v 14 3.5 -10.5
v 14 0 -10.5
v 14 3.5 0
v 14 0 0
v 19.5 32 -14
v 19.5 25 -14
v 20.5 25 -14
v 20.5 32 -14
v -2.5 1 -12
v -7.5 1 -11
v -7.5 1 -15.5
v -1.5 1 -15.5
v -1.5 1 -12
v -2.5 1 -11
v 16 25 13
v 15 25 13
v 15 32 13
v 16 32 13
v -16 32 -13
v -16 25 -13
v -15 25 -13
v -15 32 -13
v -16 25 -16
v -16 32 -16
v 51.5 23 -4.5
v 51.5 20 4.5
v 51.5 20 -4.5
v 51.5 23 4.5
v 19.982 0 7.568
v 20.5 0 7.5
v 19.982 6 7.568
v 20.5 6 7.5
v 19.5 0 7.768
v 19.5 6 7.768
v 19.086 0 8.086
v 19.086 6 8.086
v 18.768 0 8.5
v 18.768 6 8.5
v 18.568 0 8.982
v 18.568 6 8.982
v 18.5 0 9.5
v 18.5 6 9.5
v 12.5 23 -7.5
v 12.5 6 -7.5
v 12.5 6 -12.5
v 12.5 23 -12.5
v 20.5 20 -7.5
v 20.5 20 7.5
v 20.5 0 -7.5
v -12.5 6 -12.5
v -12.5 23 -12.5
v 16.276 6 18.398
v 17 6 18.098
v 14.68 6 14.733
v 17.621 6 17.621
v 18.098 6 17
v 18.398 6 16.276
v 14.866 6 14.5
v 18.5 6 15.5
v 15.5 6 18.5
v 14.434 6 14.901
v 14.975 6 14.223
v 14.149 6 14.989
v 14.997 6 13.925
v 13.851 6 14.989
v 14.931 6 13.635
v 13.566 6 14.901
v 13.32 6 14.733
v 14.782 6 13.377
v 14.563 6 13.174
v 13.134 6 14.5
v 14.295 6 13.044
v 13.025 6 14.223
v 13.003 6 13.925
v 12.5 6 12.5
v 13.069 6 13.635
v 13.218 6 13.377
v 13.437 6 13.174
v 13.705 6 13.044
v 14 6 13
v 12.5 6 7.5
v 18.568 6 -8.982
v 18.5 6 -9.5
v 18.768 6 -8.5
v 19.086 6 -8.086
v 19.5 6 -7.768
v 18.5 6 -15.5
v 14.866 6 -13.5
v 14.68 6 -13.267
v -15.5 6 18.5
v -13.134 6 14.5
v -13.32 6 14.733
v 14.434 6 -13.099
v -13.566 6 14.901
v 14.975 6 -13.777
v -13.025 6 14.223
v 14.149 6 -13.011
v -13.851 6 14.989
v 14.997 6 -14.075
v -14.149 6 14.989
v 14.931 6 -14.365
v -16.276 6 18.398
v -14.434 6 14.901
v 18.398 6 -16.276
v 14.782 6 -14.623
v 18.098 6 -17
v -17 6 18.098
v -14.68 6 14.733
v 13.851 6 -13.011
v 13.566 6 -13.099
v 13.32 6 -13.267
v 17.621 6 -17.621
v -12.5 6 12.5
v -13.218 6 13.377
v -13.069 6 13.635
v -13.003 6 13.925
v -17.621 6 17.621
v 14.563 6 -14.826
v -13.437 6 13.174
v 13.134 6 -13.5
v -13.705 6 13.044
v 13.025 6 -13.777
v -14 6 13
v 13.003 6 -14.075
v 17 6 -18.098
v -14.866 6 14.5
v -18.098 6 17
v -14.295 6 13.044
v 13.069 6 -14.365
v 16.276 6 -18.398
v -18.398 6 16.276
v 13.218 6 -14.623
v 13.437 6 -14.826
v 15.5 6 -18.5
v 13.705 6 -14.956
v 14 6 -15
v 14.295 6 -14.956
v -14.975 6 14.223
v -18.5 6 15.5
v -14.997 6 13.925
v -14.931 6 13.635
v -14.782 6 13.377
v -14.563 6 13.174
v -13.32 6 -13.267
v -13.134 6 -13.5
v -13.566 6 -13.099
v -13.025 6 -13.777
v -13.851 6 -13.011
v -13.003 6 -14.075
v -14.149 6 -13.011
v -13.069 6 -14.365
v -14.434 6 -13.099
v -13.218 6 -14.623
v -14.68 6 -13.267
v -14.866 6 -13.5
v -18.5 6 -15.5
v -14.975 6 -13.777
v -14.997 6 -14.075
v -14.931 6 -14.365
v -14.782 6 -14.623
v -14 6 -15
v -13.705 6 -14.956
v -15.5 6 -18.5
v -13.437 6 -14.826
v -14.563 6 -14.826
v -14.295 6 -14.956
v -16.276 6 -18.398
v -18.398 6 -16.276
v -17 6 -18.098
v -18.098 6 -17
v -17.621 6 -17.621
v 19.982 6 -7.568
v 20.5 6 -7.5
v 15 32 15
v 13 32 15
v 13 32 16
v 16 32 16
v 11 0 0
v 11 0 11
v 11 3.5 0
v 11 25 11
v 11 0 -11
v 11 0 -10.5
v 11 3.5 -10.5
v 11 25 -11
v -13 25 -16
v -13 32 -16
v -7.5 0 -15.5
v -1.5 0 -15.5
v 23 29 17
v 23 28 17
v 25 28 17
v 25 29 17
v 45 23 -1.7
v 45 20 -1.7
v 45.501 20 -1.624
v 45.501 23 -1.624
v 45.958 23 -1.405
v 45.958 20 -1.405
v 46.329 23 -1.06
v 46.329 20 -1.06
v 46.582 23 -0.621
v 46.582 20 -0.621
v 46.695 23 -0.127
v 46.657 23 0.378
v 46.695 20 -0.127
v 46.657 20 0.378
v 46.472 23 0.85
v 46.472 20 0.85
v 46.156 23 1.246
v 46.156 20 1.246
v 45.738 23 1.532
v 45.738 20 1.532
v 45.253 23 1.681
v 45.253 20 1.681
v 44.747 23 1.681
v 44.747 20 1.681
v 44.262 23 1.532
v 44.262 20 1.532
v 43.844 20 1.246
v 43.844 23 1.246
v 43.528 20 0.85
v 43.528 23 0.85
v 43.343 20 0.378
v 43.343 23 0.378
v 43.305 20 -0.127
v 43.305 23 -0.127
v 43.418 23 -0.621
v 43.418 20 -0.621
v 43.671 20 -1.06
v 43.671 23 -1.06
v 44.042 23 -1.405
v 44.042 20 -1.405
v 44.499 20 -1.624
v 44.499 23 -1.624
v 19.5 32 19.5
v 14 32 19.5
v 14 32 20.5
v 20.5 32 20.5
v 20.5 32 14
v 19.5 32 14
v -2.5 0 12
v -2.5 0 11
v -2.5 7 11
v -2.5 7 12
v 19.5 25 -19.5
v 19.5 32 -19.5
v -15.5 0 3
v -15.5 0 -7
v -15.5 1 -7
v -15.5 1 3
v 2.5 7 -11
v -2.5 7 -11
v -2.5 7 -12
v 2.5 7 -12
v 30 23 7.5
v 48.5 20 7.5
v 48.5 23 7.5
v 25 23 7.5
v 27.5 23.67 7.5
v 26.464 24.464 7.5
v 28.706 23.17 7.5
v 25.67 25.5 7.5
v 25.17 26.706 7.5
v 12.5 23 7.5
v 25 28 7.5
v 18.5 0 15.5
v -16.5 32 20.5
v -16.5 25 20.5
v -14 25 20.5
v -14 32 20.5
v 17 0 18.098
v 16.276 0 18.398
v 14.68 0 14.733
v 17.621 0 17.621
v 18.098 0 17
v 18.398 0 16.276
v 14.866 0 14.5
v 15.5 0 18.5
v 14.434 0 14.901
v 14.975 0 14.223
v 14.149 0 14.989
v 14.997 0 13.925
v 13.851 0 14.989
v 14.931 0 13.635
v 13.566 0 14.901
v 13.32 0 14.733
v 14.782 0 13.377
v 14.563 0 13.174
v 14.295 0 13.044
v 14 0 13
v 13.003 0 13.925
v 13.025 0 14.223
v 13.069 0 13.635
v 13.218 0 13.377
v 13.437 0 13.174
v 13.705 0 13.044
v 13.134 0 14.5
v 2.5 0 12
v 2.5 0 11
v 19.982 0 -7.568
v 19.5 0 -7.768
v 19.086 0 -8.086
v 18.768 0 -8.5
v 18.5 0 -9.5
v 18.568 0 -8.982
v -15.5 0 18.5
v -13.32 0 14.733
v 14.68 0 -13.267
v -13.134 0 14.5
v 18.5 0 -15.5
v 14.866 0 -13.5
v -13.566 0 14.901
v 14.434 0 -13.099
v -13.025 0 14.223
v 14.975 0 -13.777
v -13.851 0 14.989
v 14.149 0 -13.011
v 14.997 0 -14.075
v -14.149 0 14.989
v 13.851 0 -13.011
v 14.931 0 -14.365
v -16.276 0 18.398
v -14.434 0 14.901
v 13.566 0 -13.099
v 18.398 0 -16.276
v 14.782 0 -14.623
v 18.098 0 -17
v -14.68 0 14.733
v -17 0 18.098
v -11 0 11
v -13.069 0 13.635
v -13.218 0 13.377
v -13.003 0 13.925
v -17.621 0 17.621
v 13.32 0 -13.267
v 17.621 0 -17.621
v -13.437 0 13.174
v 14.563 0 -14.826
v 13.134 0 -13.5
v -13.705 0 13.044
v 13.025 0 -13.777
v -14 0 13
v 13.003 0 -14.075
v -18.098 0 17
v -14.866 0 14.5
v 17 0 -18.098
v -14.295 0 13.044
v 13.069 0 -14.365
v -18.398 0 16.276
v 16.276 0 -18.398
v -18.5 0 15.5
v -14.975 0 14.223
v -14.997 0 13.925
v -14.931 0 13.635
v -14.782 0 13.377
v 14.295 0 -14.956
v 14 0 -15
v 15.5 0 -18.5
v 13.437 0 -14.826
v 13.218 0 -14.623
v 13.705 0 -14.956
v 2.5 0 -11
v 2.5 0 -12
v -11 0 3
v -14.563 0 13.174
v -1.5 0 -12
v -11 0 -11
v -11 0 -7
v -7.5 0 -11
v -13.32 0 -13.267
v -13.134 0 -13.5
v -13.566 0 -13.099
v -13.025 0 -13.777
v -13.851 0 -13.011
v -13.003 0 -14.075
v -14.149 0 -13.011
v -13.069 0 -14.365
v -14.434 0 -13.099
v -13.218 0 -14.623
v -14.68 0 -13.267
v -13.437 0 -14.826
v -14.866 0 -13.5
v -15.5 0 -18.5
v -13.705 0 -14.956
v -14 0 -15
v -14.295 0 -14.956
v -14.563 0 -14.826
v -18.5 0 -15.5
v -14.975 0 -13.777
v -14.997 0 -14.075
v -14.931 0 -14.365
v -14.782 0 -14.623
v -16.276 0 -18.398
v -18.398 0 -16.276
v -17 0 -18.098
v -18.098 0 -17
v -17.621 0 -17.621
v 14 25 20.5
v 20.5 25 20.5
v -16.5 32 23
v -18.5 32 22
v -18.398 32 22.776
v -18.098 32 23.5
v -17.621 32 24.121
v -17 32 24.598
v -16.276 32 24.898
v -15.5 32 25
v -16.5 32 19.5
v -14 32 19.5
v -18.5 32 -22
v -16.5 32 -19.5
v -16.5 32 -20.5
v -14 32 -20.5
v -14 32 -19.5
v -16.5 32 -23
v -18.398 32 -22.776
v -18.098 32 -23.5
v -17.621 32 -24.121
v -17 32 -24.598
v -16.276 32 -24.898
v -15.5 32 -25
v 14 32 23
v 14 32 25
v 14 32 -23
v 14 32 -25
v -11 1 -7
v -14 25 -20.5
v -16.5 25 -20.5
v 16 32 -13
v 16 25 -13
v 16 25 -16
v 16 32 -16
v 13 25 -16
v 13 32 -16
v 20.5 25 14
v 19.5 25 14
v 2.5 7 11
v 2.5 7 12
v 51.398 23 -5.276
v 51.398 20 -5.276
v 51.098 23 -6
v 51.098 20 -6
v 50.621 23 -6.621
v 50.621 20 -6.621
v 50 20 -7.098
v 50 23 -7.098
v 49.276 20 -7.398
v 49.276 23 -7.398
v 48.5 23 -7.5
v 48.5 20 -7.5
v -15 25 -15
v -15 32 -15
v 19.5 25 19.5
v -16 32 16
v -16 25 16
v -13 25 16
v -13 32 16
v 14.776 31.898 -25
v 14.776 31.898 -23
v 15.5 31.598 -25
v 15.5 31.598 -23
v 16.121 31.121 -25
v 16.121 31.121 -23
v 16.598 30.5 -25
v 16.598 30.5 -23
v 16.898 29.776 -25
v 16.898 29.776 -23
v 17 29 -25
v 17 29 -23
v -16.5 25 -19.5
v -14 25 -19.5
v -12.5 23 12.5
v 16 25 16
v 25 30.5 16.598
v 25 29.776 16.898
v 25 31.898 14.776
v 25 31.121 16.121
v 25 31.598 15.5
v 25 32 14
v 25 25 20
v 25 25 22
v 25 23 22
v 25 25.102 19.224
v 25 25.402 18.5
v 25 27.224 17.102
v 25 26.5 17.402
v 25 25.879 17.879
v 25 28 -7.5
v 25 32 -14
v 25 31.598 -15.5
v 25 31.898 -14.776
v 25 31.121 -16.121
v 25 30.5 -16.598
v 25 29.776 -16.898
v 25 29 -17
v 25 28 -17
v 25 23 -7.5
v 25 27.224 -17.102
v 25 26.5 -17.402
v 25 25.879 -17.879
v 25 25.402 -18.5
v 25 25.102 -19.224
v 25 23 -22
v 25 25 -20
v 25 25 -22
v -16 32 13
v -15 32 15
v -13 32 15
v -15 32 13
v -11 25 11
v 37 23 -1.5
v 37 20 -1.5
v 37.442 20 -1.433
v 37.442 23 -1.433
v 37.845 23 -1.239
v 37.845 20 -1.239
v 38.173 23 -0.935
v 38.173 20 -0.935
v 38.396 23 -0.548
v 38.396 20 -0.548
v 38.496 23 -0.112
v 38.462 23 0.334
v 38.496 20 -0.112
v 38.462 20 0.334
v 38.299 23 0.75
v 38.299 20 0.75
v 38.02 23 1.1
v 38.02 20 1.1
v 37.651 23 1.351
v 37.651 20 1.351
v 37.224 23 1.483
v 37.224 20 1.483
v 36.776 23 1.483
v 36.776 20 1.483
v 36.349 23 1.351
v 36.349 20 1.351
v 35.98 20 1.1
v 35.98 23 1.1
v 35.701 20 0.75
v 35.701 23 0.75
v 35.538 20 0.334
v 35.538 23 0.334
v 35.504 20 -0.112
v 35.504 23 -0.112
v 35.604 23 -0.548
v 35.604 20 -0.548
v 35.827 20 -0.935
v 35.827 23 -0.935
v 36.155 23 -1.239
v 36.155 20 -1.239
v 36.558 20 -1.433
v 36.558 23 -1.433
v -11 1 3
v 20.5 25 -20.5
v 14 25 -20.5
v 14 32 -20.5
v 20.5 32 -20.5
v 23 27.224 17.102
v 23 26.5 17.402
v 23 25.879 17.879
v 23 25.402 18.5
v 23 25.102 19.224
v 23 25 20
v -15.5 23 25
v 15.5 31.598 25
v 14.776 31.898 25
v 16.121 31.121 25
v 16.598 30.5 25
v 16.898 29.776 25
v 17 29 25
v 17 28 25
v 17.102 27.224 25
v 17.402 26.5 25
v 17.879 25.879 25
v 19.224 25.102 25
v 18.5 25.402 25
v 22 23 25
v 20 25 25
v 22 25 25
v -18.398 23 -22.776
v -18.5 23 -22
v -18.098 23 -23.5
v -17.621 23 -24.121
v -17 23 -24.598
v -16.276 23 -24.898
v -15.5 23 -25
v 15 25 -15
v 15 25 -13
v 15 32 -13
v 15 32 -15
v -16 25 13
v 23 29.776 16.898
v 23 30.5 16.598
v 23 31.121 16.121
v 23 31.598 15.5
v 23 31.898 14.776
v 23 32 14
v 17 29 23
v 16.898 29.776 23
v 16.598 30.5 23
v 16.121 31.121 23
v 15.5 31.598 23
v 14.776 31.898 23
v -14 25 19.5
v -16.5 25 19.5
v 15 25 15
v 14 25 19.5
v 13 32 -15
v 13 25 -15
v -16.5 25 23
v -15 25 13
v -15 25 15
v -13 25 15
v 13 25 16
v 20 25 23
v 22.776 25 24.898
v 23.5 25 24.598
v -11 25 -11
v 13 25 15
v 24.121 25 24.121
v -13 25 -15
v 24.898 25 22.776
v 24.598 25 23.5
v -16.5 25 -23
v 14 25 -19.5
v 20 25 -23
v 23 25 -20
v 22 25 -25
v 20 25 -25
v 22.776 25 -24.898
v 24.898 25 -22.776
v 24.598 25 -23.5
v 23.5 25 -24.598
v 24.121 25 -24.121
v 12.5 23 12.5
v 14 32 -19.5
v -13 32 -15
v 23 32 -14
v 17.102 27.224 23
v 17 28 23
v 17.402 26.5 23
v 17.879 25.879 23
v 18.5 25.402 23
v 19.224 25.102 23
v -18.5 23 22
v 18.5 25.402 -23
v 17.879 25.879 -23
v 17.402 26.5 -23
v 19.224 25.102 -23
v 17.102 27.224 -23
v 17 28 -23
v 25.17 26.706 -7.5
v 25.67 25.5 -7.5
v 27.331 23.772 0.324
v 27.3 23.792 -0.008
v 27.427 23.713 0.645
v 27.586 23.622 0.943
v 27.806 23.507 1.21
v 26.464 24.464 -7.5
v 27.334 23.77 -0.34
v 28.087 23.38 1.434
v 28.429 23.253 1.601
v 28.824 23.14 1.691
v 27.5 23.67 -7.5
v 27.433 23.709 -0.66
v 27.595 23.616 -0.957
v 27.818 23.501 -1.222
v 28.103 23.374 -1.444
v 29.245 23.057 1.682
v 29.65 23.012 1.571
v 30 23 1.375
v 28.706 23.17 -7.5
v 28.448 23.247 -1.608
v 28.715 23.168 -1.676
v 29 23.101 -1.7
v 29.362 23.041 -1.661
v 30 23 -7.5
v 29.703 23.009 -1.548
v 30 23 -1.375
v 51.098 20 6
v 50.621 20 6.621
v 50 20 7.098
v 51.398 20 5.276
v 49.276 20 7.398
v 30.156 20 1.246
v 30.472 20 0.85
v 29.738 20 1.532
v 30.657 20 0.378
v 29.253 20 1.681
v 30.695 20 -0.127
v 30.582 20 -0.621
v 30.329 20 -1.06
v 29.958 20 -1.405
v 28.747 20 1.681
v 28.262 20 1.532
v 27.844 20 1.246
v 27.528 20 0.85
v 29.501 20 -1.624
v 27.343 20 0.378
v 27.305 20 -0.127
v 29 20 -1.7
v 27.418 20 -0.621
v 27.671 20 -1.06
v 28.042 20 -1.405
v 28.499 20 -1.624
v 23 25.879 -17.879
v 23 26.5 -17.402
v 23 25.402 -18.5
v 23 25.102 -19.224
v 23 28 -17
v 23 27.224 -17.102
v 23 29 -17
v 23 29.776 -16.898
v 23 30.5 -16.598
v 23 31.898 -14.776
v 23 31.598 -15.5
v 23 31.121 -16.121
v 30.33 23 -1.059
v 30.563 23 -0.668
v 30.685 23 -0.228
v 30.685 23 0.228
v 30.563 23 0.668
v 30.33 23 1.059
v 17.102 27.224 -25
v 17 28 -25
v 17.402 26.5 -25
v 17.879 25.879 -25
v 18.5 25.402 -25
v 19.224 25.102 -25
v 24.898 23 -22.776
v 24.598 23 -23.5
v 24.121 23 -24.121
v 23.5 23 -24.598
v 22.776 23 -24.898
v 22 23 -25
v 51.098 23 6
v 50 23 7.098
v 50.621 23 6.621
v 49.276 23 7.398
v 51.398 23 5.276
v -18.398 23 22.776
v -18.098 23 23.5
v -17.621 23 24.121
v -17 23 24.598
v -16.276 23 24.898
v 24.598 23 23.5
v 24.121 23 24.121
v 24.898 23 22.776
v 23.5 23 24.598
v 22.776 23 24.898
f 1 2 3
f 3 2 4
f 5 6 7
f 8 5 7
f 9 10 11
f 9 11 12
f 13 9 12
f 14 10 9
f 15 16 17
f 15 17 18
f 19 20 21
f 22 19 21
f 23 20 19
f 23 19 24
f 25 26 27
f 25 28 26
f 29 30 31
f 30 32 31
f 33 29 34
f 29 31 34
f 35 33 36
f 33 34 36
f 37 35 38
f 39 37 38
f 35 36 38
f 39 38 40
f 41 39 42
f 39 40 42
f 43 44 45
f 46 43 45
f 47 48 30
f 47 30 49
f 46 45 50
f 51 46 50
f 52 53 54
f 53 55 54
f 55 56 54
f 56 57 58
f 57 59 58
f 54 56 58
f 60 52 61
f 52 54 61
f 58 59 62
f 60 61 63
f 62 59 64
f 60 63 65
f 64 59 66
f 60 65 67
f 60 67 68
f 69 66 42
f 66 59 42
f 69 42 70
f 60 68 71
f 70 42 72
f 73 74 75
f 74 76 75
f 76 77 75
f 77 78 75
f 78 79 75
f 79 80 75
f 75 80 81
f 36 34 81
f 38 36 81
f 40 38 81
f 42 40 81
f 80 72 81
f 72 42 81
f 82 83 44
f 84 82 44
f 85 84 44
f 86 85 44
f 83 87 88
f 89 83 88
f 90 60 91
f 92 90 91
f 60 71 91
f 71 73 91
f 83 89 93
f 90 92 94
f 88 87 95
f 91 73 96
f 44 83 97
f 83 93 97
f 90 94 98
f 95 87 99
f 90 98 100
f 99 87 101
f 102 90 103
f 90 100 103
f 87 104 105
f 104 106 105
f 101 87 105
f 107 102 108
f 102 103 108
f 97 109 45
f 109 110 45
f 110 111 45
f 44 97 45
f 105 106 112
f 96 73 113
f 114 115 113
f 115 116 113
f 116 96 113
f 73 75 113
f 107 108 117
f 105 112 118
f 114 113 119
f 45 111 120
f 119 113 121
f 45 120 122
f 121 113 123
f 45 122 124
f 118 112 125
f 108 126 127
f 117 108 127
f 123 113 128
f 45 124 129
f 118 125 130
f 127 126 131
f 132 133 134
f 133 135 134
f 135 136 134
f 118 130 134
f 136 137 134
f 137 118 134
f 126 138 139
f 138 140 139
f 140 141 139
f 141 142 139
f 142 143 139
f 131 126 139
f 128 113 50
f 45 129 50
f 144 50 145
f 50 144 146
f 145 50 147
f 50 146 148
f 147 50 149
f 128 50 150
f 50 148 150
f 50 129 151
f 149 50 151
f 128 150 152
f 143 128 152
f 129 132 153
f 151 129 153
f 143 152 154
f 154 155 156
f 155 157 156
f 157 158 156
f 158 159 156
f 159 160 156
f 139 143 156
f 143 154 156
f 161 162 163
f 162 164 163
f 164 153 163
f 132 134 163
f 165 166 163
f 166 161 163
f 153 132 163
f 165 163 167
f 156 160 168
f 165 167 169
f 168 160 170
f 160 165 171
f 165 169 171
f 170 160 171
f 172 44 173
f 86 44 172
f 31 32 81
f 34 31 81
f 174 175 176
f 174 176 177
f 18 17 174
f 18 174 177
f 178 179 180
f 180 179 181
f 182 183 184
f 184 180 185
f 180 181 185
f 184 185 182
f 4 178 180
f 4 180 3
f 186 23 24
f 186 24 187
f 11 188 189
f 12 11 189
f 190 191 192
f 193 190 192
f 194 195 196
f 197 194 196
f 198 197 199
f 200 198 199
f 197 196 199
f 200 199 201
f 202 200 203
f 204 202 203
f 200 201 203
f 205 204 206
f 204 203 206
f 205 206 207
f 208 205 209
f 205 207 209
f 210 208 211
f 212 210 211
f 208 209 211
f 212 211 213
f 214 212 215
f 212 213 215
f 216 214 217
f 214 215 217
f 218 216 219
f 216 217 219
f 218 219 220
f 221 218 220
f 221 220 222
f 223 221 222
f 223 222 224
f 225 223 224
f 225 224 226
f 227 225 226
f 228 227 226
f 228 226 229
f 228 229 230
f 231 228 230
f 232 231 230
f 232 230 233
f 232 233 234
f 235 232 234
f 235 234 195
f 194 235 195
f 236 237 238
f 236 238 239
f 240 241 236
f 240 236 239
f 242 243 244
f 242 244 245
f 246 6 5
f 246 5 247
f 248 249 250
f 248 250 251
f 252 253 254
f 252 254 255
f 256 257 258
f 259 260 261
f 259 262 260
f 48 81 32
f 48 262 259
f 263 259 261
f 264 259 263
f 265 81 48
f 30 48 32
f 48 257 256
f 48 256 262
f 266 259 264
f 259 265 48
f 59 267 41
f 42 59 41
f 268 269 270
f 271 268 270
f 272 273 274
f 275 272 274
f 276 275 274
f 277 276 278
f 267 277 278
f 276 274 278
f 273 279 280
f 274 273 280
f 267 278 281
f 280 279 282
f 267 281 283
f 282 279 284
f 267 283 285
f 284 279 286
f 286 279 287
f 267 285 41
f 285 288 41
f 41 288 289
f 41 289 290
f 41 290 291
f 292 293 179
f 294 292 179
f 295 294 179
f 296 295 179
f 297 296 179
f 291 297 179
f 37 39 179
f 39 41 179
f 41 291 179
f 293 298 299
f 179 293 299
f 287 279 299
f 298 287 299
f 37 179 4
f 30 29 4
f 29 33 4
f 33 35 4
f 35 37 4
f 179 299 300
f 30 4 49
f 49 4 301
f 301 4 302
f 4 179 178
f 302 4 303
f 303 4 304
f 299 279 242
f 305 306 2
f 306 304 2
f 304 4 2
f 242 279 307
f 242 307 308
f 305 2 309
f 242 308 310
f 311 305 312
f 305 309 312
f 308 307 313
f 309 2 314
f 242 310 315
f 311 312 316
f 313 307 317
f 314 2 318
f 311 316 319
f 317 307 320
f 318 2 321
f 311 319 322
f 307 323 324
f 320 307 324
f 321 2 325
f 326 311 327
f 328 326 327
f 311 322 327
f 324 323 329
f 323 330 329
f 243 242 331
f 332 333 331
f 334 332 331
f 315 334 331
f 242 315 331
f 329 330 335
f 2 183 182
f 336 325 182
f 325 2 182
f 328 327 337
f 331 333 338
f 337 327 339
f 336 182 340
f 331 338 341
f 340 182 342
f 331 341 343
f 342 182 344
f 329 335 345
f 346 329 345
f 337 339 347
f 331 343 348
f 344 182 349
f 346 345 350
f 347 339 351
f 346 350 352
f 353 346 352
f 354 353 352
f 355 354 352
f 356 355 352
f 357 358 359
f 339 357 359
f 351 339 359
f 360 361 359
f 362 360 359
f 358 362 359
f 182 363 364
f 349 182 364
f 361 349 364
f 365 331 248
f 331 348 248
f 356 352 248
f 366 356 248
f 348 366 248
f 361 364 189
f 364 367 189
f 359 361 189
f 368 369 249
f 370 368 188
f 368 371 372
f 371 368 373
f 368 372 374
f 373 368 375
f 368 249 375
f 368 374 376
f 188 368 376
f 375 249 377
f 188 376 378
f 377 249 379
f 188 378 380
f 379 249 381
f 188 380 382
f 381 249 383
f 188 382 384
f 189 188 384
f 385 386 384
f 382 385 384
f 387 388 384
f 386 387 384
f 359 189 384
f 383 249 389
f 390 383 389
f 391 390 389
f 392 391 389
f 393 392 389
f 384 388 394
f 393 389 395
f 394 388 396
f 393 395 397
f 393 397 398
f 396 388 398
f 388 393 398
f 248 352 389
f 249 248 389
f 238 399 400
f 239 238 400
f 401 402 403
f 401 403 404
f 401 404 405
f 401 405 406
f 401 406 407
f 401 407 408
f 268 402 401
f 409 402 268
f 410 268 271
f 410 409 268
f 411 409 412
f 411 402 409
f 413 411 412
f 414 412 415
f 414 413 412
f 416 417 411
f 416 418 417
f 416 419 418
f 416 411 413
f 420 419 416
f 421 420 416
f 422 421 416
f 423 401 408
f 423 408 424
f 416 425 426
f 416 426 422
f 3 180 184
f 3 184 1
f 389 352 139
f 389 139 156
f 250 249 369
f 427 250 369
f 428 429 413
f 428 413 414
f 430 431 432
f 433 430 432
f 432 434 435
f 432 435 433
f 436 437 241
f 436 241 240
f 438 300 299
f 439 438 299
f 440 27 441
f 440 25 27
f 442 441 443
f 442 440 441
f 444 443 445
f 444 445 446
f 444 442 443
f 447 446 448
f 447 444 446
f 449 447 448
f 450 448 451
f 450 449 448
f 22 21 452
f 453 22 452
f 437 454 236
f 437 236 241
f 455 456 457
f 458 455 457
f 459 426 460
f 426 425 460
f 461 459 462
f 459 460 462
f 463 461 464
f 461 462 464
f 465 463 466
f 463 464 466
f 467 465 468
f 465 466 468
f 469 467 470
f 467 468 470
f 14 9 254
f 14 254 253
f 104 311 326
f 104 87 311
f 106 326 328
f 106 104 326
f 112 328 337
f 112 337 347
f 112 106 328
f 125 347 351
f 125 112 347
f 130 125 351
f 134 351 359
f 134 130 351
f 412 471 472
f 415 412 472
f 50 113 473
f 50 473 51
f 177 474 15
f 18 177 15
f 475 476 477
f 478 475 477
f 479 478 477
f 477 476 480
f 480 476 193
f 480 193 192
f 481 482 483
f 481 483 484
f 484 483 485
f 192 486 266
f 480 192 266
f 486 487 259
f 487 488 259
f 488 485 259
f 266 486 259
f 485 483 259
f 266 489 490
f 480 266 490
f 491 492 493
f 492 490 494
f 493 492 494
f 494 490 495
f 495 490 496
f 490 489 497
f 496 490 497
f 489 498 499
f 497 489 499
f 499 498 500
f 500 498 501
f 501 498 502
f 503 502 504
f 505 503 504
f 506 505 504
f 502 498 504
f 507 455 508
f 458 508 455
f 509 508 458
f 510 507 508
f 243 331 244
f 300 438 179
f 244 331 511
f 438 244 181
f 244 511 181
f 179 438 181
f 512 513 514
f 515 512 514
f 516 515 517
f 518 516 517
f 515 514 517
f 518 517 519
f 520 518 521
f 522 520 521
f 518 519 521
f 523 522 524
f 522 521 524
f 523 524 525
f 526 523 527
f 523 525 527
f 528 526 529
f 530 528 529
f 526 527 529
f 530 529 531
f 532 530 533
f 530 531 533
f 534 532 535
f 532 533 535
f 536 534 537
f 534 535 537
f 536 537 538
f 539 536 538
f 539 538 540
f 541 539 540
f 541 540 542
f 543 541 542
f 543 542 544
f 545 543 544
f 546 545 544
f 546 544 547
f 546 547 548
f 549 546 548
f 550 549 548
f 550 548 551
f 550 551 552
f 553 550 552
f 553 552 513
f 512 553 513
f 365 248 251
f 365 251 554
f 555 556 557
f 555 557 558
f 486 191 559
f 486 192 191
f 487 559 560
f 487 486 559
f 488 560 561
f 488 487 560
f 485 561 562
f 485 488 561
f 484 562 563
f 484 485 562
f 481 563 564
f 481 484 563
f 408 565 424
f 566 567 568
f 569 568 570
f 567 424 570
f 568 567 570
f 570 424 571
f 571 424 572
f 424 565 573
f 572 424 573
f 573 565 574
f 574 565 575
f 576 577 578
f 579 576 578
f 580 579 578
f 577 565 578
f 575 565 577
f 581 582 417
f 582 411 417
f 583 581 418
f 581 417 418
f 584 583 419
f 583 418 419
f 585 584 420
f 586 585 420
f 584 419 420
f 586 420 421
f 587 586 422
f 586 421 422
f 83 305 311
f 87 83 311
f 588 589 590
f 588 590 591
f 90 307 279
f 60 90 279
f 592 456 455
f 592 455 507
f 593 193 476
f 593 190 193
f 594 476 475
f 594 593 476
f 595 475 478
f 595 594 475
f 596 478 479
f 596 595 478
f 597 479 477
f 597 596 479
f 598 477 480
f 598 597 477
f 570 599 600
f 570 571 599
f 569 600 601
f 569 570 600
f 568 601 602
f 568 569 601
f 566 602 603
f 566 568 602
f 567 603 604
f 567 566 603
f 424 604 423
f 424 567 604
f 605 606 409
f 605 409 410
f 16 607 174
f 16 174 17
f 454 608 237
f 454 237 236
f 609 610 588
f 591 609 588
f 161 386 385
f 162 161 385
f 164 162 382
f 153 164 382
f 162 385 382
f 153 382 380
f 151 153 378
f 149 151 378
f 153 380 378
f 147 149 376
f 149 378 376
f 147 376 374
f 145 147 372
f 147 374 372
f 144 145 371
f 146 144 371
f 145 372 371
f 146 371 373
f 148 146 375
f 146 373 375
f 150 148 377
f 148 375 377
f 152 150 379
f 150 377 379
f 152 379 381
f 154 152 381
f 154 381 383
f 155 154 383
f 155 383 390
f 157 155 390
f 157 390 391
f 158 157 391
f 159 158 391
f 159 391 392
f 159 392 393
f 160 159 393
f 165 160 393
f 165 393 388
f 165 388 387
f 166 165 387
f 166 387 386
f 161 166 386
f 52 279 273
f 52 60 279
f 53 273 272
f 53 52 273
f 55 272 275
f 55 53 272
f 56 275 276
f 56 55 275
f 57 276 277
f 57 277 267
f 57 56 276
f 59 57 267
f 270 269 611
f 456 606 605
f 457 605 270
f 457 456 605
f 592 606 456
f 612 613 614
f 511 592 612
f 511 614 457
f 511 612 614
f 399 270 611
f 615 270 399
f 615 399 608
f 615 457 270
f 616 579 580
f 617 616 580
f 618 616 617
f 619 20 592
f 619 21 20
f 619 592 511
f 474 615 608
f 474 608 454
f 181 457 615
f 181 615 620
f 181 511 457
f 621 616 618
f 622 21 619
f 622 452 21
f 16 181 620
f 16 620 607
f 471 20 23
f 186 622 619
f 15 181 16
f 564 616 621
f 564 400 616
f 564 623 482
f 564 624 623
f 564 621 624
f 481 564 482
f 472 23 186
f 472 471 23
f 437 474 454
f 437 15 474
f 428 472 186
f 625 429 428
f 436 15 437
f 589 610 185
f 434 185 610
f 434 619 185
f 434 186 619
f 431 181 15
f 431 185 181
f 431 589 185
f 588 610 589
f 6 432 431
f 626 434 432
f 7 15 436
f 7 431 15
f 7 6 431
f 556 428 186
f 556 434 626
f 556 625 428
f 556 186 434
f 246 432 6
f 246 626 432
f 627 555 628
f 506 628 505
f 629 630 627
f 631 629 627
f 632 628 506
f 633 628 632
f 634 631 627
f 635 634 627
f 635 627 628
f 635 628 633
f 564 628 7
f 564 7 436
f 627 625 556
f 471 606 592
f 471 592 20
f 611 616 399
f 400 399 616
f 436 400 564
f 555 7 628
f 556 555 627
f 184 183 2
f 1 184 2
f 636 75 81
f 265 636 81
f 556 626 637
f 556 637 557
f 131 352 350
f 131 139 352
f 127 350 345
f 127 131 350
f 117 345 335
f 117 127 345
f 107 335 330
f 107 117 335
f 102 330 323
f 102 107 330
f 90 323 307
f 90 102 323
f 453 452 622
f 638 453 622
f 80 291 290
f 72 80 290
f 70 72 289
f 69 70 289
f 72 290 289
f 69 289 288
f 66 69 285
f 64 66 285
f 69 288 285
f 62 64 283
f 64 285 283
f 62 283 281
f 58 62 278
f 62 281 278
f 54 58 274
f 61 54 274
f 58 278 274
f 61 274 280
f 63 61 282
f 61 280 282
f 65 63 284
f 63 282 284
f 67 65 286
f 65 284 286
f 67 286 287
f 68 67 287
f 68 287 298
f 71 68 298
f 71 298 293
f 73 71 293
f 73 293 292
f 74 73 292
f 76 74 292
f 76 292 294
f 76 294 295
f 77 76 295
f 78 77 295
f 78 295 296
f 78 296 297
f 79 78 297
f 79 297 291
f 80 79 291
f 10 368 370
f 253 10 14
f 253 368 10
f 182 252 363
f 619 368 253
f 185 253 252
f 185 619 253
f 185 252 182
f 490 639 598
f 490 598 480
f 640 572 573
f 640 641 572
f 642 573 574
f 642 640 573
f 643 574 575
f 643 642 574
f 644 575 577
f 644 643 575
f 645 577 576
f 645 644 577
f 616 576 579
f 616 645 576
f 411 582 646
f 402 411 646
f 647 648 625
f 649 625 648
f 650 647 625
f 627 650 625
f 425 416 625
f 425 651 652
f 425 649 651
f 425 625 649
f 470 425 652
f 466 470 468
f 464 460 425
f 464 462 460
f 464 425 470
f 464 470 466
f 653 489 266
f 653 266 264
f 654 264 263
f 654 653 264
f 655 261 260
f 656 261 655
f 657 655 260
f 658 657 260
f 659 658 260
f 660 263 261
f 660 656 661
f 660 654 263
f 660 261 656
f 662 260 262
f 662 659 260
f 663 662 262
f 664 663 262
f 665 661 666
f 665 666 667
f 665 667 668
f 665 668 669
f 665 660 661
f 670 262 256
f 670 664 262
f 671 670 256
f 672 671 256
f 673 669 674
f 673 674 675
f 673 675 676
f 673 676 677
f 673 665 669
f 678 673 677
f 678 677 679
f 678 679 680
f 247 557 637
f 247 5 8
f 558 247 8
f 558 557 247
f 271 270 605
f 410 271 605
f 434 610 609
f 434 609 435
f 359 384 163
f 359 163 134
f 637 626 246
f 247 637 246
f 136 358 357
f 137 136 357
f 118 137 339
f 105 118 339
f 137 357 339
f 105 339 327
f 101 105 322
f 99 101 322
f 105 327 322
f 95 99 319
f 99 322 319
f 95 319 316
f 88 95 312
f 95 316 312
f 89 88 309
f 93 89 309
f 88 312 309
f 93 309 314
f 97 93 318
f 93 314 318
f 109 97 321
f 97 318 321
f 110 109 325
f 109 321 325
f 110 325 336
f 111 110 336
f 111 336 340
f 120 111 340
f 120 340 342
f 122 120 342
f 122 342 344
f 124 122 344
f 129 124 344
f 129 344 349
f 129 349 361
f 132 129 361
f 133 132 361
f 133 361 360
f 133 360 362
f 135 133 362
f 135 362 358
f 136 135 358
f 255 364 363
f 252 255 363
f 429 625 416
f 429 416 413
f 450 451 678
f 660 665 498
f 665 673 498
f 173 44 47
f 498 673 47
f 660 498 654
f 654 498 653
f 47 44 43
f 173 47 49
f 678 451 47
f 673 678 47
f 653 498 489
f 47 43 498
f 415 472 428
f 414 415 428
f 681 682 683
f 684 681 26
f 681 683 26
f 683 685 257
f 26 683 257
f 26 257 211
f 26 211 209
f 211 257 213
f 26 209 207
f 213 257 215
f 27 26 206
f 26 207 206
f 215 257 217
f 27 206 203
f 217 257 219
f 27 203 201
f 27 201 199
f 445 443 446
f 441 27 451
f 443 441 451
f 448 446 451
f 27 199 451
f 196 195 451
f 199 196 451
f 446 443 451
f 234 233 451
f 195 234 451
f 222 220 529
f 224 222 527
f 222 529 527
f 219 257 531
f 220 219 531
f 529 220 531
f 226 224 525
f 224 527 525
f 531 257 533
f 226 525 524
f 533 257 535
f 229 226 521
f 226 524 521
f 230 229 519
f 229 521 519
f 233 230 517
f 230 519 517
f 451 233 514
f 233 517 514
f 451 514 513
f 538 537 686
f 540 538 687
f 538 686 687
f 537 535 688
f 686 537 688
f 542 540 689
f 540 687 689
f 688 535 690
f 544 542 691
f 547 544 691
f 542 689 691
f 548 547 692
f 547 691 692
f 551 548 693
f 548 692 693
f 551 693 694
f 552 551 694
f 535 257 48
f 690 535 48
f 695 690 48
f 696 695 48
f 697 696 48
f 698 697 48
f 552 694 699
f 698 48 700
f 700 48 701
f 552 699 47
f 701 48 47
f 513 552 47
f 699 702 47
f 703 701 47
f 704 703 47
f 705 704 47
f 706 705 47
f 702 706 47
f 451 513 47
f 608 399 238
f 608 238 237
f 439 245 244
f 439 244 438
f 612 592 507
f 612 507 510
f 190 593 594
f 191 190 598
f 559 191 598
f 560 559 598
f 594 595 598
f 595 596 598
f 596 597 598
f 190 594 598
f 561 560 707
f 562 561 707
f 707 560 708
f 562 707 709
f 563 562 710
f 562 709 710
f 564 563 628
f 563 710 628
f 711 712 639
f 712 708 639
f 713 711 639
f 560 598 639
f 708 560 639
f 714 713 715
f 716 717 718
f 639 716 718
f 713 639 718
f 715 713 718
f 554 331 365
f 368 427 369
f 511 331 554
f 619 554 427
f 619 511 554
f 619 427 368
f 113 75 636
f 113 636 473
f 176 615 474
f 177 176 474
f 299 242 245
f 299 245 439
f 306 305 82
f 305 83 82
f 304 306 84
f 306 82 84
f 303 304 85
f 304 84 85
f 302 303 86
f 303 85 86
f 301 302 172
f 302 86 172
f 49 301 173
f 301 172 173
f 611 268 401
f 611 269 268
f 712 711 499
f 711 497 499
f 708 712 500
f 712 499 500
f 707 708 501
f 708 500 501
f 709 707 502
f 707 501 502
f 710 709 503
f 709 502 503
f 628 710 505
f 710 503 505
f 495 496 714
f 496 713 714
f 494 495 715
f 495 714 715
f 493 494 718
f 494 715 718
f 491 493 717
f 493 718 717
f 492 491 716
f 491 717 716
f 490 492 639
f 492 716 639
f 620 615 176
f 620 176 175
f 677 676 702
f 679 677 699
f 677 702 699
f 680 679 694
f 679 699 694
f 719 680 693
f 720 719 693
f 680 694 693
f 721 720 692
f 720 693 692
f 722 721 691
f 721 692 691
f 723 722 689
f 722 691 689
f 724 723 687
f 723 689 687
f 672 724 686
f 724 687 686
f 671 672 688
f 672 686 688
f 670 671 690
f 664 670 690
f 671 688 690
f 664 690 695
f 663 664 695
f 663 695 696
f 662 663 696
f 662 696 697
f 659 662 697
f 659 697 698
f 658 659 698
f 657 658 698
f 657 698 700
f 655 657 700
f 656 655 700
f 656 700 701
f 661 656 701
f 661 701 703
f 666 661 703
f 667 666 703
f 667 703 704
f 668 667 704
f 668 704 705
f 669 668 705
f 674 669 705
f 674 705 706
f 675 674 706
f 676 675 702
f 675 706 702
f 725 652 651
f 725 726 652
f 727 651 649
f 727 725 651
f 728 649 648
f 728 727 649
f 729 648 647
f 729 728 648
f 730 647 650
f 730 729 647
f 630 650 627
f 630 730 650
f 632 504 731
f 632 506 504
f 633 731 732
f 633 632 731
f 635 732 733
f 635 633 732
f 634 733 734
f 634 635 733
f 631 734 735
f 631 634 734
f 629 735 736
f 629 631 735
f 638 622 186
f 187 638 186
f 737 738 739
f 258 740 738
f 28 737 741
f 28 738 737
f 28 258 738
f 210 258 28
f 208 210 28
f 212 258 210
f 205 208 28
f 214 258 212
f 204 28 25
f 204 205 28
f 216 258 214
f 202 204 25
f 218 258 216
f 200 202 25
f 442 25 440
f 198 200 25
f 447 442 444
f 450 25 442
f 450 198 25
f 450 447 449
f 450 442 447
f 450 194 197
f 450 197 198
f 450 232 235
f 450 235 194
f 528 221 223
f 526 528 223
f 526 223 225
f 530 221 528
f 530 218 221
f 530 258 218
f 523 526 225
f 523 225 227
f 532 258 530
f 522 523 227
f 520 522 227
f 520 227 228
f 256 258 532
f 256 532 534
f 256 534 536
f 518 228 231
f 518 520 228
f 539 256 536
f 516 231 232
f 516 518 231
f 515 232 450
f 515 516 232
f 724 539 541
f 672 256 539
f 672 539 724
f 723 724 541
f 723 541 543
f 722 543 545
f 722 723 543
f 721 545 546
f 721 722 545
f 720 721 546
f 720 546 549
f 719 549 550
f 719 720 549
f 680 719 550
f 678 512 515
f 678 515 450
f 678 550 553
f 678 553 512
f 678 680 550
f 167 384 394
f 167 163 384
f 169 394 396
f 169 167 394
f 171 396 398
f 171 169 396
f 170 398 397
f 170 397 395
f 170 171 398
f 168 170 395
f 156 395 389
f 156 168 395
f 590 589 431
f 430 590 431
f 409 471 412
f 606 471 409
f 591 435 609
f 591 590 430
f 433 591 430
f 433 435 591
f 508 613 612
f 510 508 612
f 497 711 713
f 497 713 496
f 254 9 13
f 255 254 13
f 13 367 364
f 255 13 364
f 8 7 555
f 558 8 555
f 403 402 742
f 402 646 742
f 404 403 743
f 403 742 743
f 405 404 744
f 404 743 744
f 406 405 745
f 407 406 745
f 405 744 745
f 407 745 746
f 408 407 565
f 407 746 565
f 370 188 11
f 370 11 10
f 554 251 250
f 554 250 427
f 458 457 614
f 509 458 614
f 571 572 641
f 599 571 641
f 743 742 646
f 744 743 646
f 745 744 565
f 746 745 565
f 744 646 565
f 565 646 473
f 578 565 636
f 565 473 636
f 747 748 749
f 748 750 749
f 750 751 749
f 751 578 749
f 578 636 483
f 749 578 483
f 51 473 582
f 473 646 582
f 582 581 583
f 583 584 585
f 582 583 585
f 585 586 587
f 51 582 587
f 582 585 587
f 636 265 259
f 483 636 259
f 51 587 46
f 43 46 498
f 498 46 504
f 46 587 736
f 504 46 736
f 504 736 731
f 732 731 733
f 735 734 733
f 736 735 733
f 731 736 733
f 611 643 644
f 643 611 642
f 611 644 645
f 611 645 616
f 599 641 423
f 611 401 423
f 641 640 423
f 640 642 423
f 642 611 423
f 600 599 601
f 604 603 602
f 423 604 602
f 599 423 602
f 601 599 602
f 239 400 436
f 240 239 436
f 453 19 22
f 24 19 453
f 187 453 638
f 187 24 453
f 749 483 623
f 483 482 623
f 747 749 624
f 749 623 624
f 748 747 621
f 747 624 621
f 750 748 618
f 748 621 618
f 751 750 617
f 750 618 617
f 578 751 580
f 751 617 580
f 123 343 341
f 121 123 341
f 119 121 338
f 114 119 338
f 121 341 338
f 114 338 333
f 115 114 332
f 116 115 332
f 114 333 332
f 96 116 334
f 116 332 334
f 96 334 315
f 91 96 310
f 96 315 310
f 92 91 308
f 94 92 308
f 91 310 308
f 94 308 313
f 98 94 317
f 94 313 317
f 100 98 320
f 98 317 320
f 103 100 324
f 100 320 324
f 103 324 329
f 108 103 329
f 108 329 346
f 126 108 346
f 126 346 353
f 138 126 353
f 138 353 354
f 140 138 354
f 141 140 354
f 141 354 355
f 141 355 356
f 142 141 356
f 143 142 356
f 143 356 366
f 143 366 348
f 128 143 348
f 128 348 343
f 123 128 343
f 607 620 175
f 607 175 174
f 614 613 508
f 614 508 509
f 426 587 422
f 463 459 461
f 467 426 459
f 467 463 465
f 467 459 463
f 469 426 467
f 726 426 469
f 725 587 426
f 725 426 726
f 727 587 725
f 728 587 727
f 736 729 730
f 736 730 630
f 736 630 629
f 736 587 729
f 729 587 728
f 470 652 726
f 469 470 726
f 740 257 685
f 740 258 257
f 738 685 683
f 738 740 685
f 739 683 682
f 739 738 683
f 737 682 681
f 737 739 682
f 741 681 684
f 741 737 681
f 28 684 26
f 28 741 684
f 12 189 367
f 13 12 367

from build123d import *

# Parameters (mm, degrees)
SKETCH_2_W            = 37
SKETCH_2_H            = 37
EXTRUDE_1_DEPTH       = 23
SKETCH_3_W            = 22
SKETCH_3_H            = 22
CUT_EXTRUDE_1_DEPTH   = 23
SKETCH_19_OUTSIDE_W   = 50.432
SKETCH_19_OUTSIDE_H   = 50.432
SKETCH_19_OUTSIDE_W_2 = 25
SKETCH_19_OUTSIDE_H_2 = 25
CUT_EXTRUDE_17_DEPTH  = 17
SKETCH_4_W            = 50
SKETCH_4_H            = 50
EXTRUDE_2_DEPTH       = 9
SKETCH_5_W            = 46
SKETCH_5_H            = 46
CUT_EXTRUDE_3_DEPTH   = 7
SKETCH_12_W           = 8
SKETCH_12_H           = 8
CUT_EXTRUDE_14_DEPTH  = 14
SKETCH_6_W            = 22
SKETCH_6_H            = 22
CUT_EXTRUDE_4_DEPTH   = 2
SKETCH_11_R           = 1
CUT_EXTRUDE_7_DEPTH   = 8
SKETCH_13_W           = 41
SKETCH_13_H           = 41
SKETCH_13_W_2         = 39
SKETCH_13_H_2         = 39
EXTRUDE_3_DEPTH       = 7
SKETCH_17_W           = 32
SKETCH_17_H           = 32
SKETCH_17_W_2         = 30
SKETCH_17_H_2         = 30
EXTRUDE_4_DEPTH       = 7
SKETCH_15_W           = 28
SKETCH_15_H           = 1
SKETCH_15_W_2         = 1
SKETCH_15_H_2         = 28
CUT_EXTRUDE_15_DEPTH  = 7
SKETCH_18_W           = 1
SKETCH_18_H           = 26
SKETCH_18_W_2         = 26
SKETCH_18_H_2         = 1
CUT_EXTRUDE_16_DEPTH  = 7
SKETCH_20_W           = 3
SKETCH_20_H           = 10.5
CUT_EXTRUDE_18_DEPTH  = 3.5
SKETCH_21_W           = 4.5
SKETCH_21_H           = 10
CUT_EXTRUDE_19_DEPTH  = 1
SKETCH_22_W           = 5
SKETCH_22_H           = 1
CUT_EXTRUDE_21_DEPTH  = 7
SKETCH_24_W           = 6
SKETCH_24_H           = 4.5
CUT_EXTRUDE_22_DEPTH  = 1
SKETCH_25_W           = 6
SKETCH_25_H           = 15
EXTRUDE_5_DEPTH       = 17
SKETCH_26_W           = 15
SKETCH_26_H           = 3
EXTRUDE_6_DEPTH       = 33
SKETCH_28_W           = 6.5
SKETCH_28_H           = 50
CUT_EXTRUDE_27_DEPTH  = 13
SKETCH_32_W           = 2
SKETCH_32_H           = 50
EXTRUDE_9_DEPTH       = 9
FILLET_5_R            = 3
FILLET_6_R            = 3
FILLET_7_R            = 3
FILLET_8_R            = 3
FILLET_9_R            = 3
FILLET_10_R           = 3
FILLET_11_R           = 3
FILLET_12_R           = 3
FILLET_13_R           = 3
FILLET_14_R           = 3
FILLET_15_R           = 3
FILLET_16_R           = 3
FILLET_17_R           = 5
FILLET_19_R           = 3
FILLET_20_R           = 3
FILLET_21_R           = 3
FILLET_22_R           = 3
SKETCH_34_W           = 15
SKETCH_34_H           = 20
EXTRUDE_10_DEPTH      = 2
SKETCH_33_R           = 1.7
SKETCH_33_R_2         = 1.5
CUT_EXTRUDE_28_DEPTH  = 7
FILLET_23_R           = 3
FILLET_24_R           = 3
FILLET_25_R           = 2
FILLET_26_R           = 2


with BuildPart() as part:
    # 草图2 → 凸台-拉伸1 (new body)
    with BuildSketch(Plane(origin=(0, 0, 0), x_dir=(1, 0, 0), z_dir=(0, 1, 0))):
        Rectangle(SKETCH_2_W, SKETCH_2_H)
    extrude(amount=EXTRUDE_1_DEPTH)

    # 草图3 → 切除-拉伸1 (cut)
    with BuildSketch(Plane.XZ):
        Rectangle(SKETCH_3_W, SKETCH_3_H)
    extrude(amount=-CUT_EXTRUDE_1_DEPTH, mode=Mode.SUBTRACT)

    # 草图19 outside → 切除-拉伸17 (cut)
    with BuildSketch(Plane(origin=(0, 6, 0), x_dir=(-1, 0, 0), z_dir=(0, -1, 0))):
        Rectangle(SKETCH_19_OUTSIDE_W, SKETCH_19_OUTSIDE_H)
        Rectangle(SKETCH_19_OUTSIDE_W_2, SKETCH_19_OUTSIDE_H_2, mode=Mode.SUBTRACT)
    extrude(amount=-CUT_EXTRUDE_17_DEPTH, mode=Mode.SUBTRACT)

    # 草图4 → 凸台-拉伸2 (add)
    with BuildSketch(Plane(origin=(0, 23, 0), x_dir=(1, 0, 0), z_dir=(0, 1, 0))):
        Rectangle(SKETCH_4_W, SKETCH_4_H)
    extrude(amount=EXTRUDE_2_DEPTH)

    # 草图5 → 切除-拉伸3 (cut)
    with BuildSketch(Plane(origin=(0, 32, 0), x_dir=(1, 0, 0), z_dir=(0, 1, 0))):
        Rectangle(SKETCH_5_W, SKETCH_5_H)
    extrude(amount=-CUT_EXTRUDE_3_DEPTH, mode=Mode.SUBTRACT)

    # 草图12 → 切除-拉伸14 (cut)
    with BuildSketch(Plane(origin=(0, 25, 0), x_dir=(1, 0, 0), z_dir=(0, 1, 0))):
        with Locations((-21, -21)):
            Rectangle(SKETCH_12_W, SKETCH_12_H)
        with Locations((-21, 21)):
            Rectangle(SKETCH_12_W, SKETCH_12_H)
        with Locations((21, 21)):
            Rectangle(SKETCH_12_W, SKETCH_12_H)
        with Locations((21, -21)):
            Rectangle(SKETCH_12_W, SKETCH_12_H)
    extrude(amount=CUT_EXTRUDE_14_DEPTH, mode=Mode.SUBTRACT)

    # 草图6 → 切除-拉伸4 (cut)
    with BuildSketch(Plane(origin=(0, 25, 0), x_dir=(1, 0, 0), z_dir=(0, 1, 0))):
        Rectangle(SKETCH_6_W, SKETCH_6_H)
    extrude(amount=-CUT_EXTRUDE_4_DEPTH, mode=Mode.SUBTRACT)

    # 草图11 → 切除-拉伸7 (cut)
    with BuildSketch(Plane.XZ):
        with Locations(Location((14, 14, 0), (0, 0, 270))):
            Circle(SKETCH_11_R)
        with Locations(Location((14, -14, 0), (0, 0, 270))):
            Circle(SKETCH_11_R)
        with Locations(Location((-14, -14, 0), (0, 0, 270))):
            Circle(SKETCH_11_R)
        with Locations(Location((-14, 14, 0), (0, 0, 270))):
            Circle(SKETCH_11_R)
    extrude(amount=-CUT_EXTRUDE_7_DEPTH, mode=Mode.SUBTRACT)

    # 草图13 → 凸台-拉伸3 (add)
    with BuildSketch(Plane(origin=(0, 25, 0), x_dir=(1, 0, 0), z_dir=(0, 1, 0))):
        Rectangle(SKETCH_13_W, SKETCH_13_H)
        Rectangle(SKETCH_13_W_2, SKETCH_13_H_2, mode=Mode.SUBTRACT)
    extrude(amount=EXTRUDE_3_DEPTH)

    # 草图17 → 凸台-拉伸4 (add)
    with BuildSketch(Plane(origin=(0, 25, 0), x_dir=(1, 0, 0), z_dir=(0, 1, 0))):
        Rectangle(SKETCH_17_W, SKETCH_17_H)
        Rectangle(SKETCH_17_W_2, SKETCH_17_H_2, mode=Mode.SUBTRACT)
    extrude(amount=EXTRUDE_4_DEPTH)

    # 草图15 → 切除-拉伸15 (cut)
    with BuildSketch(Plane(origin=(0, 25, 0), x_dir=(1, 0, 0), z_dir=(0, 1, 0))):
        with Locations((0, -20)):
            Rectangle(SKETCH_15_W, SKETCH_15_H)
        with Locations((20, 0)):
            Rectangle(SKETCH_15_W_2, SKETCH_15_H_2)
        with Locations((-20, 0)):
            Rectangle(SKETCH_15_W_2, SKETCH_15_H_2)
        with Locations((0, 20)):
            Rectangle(SKETCH_15_W, SKETCH_15_H)
    extrude(amount=CUT_EXTRUDE_15_DEPTH, mode=Mode.SUBTRACT)

    # 草图18 → 切除-拉伸16 (cut)
    with BuildSketch(Plane(origin=(0, 25, 0), x_dir=(1, 0, 0), z_dir=(0, 1, 0))):
        with Locations((15.5, 0)):
            Rectangle(SKETCH_18_W, SKETCH_18_H)
        with Locations((0, -15.5)):
            Rectangle(SKETCH_18_W_2, SKETCH_18_H_2)
        with Locations((-15.5, 0)):
            Rectangle(SKETCH_18_W, SKETCH_18_H)
        with Locations((0, 15.5)):
            Rectangle(SKETCH_18_W_2, SKETCH_18_H_2)
    extrude(amount=CUT_EXTRUDE_16_DEPTH, mode=Mode.SUBTRACT)

    # 草图20 → 切除-拉伸18 (cut)
    with BuildSketch(Plane.XZ):
        with Locations((12.5, -5.25)):
            Rectangle(SKETCH_20_W, SKETCH_20_H)
    extrude(amount=-CUT_EXTRUDE_18_DEPTH, mode=Mode.SUBTRACT)

    # 草图21 → 切除-拉伸19 (cut)
    with BuildSketch(Plane.XZ):
        with Locations((-13.25, -2)):
            Rectangle(SKETCH_21_W, SKETCH_21_H)
    extrude(amount=-CUT_EXTRUDE_19_DEPTH, mode=Mode.SUBTRACT)

    # 草图22 → 切除-拉伸21 (cut)
    with BuildSketch(Plane.XZ):
        with Locations((0, -11.5)):
            Rectangle(SKETCH_22_W, SKETCH_22_H)
        with Locations((0, 11.5)):
            Rectangle(SKETCH_22_W, SKETCH_22_H)
    extrude(amount=-CUT_EXTRUDE_21_DEPTH, mode=Mode.SUBTRACT)

    # 草图24 → 切除-拉伸22 (cut)
    with BuildSketch(Plane.XZ):
        with Locations((-4.5, -13.25)):
            Rectangle(SKETCH_24_W, SKETCH_24_H)
    extrude(amount=-CUT_EXTRUDE_22_DEPTH, mode=Mode.SUBTRACT)

    # 草图25 → 凸台-拉伸5 (add)
    with BuildSketch(Plane(origin=(0, 6, 0), x_dir=(1, 0, 0), z_dir=(0, 1, 0))):
        with Locations((15.5, 0)):
            Rectangle(SKETCH_25_W, SKETCH_25_H)
    extrude(amount=EXTRUDE_5_DEPTH)

    # 草图26 → 凸台-拉伸6 (add)
    with BuildSketch(Plane(origin=(18.5, 0, 0), x_dir=(0, 0, -1), z_dir=(1, 0, 0))):
        with Locations((0, 21.5)):
            Rectangle(SKETCH_26_W, SKETCH_26_H)
    extrude(amount=EXTRUDE_6_DEPTH)

    # 草图28 → 切除-拉伸27 (cut)
    with BuildSketch(Plane.XZ.offset(-23)):
        with Locations((-21.75, 0)):
            Rectangle(SKETCH_28_W, SKETCH_28_H)
    extrude(amount=-CUT_EXTRUDE_27_DEPTH, mode=Mode.SUBTRACT)

    # 草图32 → 凸台-拉伸9 (add)
    with BuildSketch(Plane.XZ.offset(-23)):
        with Locations((-17.5, 0)):
            Rectangle(SKETCH_32_W, SKETCH_32_H)
    extrude(amount=-EXTRUDE_9_DEPTH)

    # 圆角5
    fillet_5_edges = [part.edges().sort_by_distance(p)[0] for p in [
        (25, 24, -25),
    ]]
    fillet(fillet_5_edges, radius=FILLET_5_R)

    # 圆角6
    fillet_6_edges = [part.edges().sort_by_distance(p)[0] for p in [
        (25, 24, 25),
    ]]
    fillet(fillet_6_edges, radius=FILLET_6_R)

    # 圆角7
    fillet_7_edges = [part.edges().sort_by_distance(p)[0] for p in [
        (-18.5, 27.5, -25),
    ]]
    fillet(fillet_7_edges, radius=FILLET_7_R)

    # 圆角8
    fillet_8_edges = [part.edges().sort_by_distance(p)[0] for p in [
        (-18.5, 27.5, 25),
    ]]
    fillet(fillet_8_edges, radius=FILLET_8_R)

    # 圆角9
    fillet_9_edges = [part.edges().sort_by_distance(p)[0] for p in [
        (17, 32, -24),
    ]]
    fillet(fillet_9_edges, radius=FILLET_9_R)

    # 圆角10
    fillet_10_edges = [part.edges().sort_by_distance(p)[0] for p in [
        (17, 25, -24),
    ]]
    fillet(fillet_10_edges, radius=FILLET_10_R)

    # 圆角11
    fillet_11_edges = [part.edges().sort_by_distance(p)[0] for p in [
        (24, 32, -17),
    ]]
    fillet(fillet_11_edges, radius=FILLET_11_R)

    # 圆角12
    fillet_12_edges = [part.edges().sort_by_distance(p)[0] for p in [
        (24, 25, -17),
    ]]
    fillet(fillet_12_edges, radius=FILLET_12_R)

    # 圆角13
    fillet_13_edges = [part.edges().sort_by_distance(p)[0] for p in [
        (17, 32, 24),
    ]]
    fillet(fillet_13_edges, radius=FILLET_13_R)

    # 圆角14
    fillet_14_edges = [part.edges().sort_by_distance(p)[0] for p in [
        (17, 25, 24),
    ]]
    fillet(fillet_14_edges, radius=FILLET_14_R)

    # 圆角15
    fillet_15_edges = [part.edges().sort_by_distance(p)[0] for p in [
        (24, 32, 17),
    ]]
    fillet(fillet_15_edges, radius=FILLET_15_R)

    # 圆角16
    fillet_16_edges = [part.edges().sort_by_distance(p)[0] for p in [
        (24, 25, 17),
    ]]
    fillet(fillet_16_edges, radius=FILLET_16_R)

    # 圆角17
    fillet_17_edges = [part.edges().sort_by_distance(p)[0] for p in [
        (25, 23, 0),
    ]]
    fillet(fillet_17_edges, radius=FILLET_17_R)

    # 圆角19
    fillet_19_edges = [part.edges().sort_by_distance(p)[0] for p in [
        (-18.5, 3, -18.5),
    ]]
    fillet(fillet_19_edges, radius=FILLET_19_R)

    # 圆角20
    fillet_20_edges = [part.edges().sort_by_distance(p)[0] for p in [
        (-18.5, 3, 18.5),
    ]]
    fillet(fillet_20_edges, radius=FILLET_20_R)

    # 圆角21
    fillet_21_edges = [part.edges().sort_by_distance(p)[0] for p in [
        (18.5, 3, 18.5),
    ]]
    fillet(fillet_21_edges, radius=FILLET_21_R)

    # 圆角22
    fillet_22_edges = [part.edges().sort_by_distance(p)[0] for p in [
        (18.5, 3, -18.5),
    ]]
    fillet(fillet_22_edges, radius=FILLET_22_R)

    # 草图34 → 凸台-拉伸10 (add)
    with BuildSketch(Plane(origin=(18.5, 0, 0), x_dir=(0, 0, -1), z_dir=(1, 0, 0))):
        with Locations((0, 10)):
            Rectangle(SKETCH_34_W, SKETCH_34_H)
    extrude(amount=EXTRUDE_10_DEPTH)

    # 草图33 → 切除-拉伸28 (cut)
    with BuildSketch(Plane.XZ.offset(-20)):
        with Locations(Location((29, 0, 0), (0, 0, 270))):
            Circle(SKETCH_33_R)
        with Locations(Location((37, 0, 0), (0, 0, 270))):
            Circle(SKETCH_33_R_2)
        with Locations(Location((45, 0, 0), (0, 0, 270))):
            Circle(SKETCH_33_R)
    extrude(amount=-CUT_EXTRUDE_28_DEPTH, mode=Mode.SUBTRACT)

    # 圆角23
    fillet_23_edges = [part.edges().sort_by_distance(p)[0] for p in [
        (51.5, 21.5, 7.5),
    ]]
    fillet(fillet_23_edges, radius=FILLET_23_R)

    # 圆角24
    fillet_24_edges = [part.edges().sort_by_distance(p)[0] for p in [
        (51.5, 21.5, -7.5),
    ]]
    fillet(fillet_24_edges, radius=FILLET_24_R)

    # 圆角25
    fillet_25_edges = [part.edges().sort_by_distance(p)[0] for p in [
        (18.5, 3, 7.5),
    ]]
    fillet(fillet_25_edges, radius=FILLET_25_R - 0.0001)  # a hair under: the kernel refuses the full size

    # 圆角26
    fillet_26_edges = [part.edges().sort_by_distance(p)[0] for p in [
        (18.5, 3, -7.5),
    ]]
    fillet(fillet_26_edges, radius=FILLET_26_R - 0.0001)  # a hair under: the kernel refuses the full size


solid = part.part
